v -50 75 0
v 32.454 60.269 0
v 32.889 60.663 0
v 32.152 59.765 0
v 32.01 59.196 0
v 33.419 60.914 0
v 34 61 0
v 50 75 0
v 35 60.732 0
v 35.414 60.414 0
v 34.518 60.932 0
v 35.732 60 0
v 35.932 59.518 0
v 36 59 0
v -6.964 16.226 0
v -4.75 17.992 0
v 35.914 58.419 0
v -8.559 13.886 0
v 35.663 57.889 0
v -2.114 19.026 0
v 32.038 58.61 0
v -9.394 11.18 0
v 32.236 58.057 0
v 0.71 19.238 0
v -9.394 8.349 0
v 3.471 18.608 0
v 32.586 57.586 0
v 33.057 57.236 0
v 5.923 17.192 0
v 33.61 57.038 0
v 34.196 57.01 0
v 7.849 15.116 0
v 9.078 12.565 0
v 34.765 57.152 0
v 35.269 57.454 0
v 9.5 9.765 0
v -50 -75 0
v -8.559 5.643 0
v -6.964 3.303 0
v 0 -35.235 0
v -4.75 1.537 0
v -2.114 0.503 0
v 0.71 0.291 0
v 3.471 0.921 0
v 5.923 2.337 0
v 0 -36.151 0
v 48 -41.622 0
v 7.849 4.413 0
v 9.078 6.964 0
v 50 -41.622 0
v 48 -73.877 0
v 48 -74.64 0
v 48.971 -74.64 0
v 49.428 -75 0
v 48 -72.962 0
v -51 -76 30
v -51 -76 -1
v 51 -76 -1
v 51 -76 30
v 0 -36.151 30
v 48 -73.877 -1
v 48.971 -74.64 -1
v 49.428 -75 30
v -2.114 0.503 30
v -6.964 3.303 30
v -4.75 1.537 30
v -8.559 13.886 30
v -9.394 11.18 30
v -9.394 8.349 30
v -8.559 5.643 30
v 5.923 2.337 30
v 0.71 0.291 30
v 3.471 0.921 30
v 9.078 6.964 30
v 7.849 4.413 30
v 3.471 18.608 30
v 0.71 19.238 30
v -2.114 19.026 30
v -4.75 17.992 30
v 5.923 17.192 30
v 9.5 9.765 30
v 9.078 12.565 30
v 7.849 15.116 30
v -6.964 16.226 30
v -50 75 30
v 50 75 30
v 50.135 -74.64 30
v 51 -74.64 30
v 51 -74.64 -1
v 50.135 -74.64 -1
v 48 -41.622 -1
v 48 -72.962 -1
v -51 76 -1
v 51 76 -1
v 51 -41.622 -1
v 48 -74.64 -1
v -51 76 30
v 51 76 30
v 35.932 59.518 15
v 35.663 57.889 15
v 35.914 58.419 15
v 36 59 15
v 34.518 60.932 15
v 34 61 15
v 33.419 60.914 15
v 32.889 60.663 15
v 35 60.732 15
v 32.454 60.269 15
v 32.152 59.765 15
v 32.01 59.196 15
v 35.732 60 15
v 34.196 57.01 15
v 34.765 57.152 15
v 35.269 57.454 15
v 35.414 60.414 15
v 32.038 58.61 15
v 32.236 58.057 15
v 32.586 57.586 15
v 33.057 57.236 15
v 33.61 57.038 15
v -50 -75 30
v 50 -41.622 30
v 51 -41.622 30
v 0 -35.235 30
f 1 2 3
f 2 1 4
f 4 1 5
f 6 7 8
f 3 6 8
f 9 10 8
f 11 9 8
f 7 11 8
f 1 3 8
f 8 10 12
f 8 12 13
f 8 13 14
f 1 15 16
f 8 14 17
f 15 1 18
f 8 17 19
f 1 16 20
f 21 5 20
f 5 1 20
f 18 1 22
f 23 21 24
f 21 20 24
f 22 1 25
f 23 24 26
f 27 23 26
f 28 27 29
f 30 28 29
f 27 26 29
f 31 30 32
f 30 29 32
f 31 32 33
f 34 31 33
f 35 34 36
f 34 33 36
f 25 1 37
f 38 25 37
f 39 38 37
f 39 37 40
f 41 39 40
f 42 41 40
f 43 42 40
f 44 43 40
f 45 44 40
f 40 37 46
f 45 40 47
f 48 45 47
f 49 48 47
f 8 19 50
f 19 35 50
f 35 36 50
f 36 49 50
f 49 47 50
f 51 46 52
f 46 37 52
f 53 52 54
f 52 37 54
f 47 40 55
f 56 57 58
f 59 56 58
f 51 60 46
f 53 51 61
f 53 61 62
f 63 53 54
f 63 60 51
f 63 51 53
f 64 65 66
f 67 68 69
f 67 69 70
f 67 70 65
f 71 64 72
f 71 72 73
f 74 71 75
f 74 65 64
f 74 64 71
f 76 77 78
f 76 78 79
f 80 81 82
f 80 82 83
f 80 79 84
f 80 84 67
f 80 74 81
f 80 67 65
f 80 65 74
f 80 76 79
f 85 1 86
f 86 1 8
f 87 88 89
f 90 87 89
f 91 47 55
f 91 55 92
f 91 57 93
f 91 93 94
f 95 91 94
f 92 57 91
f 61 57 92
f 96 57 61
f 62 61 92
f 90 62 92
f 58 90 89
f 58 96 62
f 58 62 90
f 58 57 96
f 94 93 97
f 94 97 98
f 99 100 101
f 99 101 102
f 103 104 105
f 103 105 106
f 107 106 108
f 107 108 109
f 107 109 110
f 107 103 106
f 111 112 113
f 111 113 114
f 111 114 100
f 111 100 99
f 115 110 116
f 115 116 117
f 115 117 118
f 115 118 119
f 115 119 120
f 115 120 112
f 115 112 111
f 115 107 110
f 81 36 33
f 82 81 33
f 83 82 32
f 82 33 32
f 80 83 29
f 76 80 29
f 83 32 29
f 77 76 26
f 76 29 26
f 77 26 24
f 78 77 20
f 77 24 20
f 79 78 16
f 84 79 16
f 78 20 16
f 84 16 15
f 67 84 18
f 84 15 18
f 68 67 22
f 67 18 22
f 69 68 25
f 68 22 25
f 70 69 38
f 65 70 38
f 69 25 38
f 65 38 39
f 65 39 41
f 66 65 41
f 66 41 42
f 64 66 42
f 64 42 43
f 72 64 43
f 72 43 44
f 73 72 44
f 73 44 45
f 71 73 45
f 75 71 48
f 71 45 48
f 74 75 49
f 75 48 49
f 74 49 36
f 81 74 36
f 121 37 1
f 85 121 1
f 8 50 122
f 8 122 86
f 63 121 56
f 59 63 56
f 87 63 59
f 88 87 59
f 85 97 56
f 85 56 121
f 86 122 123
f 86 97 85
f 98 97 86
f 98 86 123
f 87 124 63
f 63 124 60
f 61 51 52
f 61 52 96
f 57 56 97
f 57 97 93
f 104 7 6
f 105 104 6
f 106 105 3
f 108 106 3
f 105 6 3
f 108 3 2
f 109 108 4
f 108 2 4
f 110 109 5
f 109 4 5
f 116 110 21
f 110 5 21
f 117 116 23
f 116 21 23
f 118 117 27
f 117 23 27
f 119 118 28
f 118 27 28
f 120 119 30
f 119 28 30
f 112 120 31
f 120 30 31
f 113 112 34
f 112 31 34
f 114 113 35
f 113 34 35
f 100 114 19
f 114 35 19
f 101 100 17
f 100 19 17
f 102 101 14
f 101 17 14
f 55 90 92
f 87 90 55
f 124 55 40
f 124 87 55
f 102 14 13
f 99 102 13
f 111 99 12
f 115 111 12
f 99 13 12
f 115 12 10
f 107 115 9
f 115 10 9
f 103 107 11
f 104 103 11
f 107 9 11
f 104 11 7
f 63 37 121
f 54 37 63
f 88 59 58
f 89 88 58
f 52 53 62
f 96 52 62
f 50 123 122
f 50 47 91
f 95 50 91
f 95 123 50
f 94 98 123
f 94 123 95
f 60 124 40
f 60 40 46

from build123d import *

# Parameters (mm, degrees)
SKETCH_1_W           = 102
SKETCH_1_H           = 152
SKETCH_1_W_2         = 100
SKETCH_1_H_2         = 150
EXTRUDE_1_DEPTH      = 30
EXTRUDE_2_DEPTH      = 76
EXTRUDE_2_DEPTH_BACK = 76
SKETCH_2_W           = 102
SKETCH_2_H           = 1
SKETCH_3_R           = 9.5
EXTRUDE_3_DEPTH      = 30
EXTRUDE_4_DEPTH      = 15
SKETCH_6_W           = 31
SKETCH_6_H           = 33.017960066
CUT_EXTRUDE_1_DEPTH  = 3
EXTRUDE_5_DEPTH      = 31


with BuildPart() as part:
    # 草图1 → 凸台-拉伸1 (new body)
    with BuildSketch(Plane.XY):
        Rectangle(SKETCH_1_W, SKETCH_1_H)
        Rectangle(SKETCH_1_W_2, SKETCH_1_H_2, mode=Mode.SUBTRACT)
    extrude(amount=EXTRUDE_1_DEPTH)

    # 草图2 → 凸台-拉伸2 (add, two sides: drawn at the far end of the back side and taken through both)
    with BuildSketch(Plane(origin=(0, 0, 0), x_dir=(1, 0, 0), z_dir=(0, 1, 0)).offset(-EXTRUDE_2_DEPTH_BACK)):
        with Locations((0, 0.5)):
            Rectangle(SKETCH_2_W, SKETCH_2_H)
    extrude(amount=EXTRUDE_2_DEPTH + EXTRUDE_2_DEPTH_BACK)

    # 草图3 → 凸台-拉伸3 (add)
    with BuildSketch(Plane.XY):
        with Locations((0, 9.764589886)):
            Circle(SKETCH_3_R)
    extrude(amount=EXTRUDE_3_DEPTH)

    # 草图5 → 凸台-拉伸4 (add)
    with BuildSketch(Plane.XY):
        with BuildLine():
            ThreePointArc((36, 59), (35.414213562, 60.414213562), (34, 61))
            Line((34, 61), (34, 59))
            Line((34, 59), (36, 59))
        make_face()
        with BuildLine():
            Line((34, 59), (34, 61))
            ThreePointArc((34, 61), (32.585786438, 57.585786438), (36, 59))
            Line((36, 59), (34, 59))
        make_face()
    extrude(amount=EXTRUDE_4_DEPTH)

    # 草图6 → 切除-拉伸1 (cut)
    with BuildSketch(Plane(origin=(51, 0, 0), x_dir=(0, 0, -1), z_dir=(1, 0, 0))):
        with Locations((-14.5, -58.131256351)):
            Rectangle(SKETCH_6_W, SKETCH_6_H)
    extrude(amount=-CUT_EXTRUDE_1_DEPTH, mode=Mode.SUBTRACT)

    # 草图7 → 凸台-拉伸5 (add)
    with BuildSketch(Plane.XY.offset(30)):
        Polygon((49.826203417, -75.312750473), (51, -75.320118192), (0, -35.235410114), (0, -36.150616776), align=None)
    extrude(amount=-EXTRUDE_5_DEPTH)


solid = part.part
